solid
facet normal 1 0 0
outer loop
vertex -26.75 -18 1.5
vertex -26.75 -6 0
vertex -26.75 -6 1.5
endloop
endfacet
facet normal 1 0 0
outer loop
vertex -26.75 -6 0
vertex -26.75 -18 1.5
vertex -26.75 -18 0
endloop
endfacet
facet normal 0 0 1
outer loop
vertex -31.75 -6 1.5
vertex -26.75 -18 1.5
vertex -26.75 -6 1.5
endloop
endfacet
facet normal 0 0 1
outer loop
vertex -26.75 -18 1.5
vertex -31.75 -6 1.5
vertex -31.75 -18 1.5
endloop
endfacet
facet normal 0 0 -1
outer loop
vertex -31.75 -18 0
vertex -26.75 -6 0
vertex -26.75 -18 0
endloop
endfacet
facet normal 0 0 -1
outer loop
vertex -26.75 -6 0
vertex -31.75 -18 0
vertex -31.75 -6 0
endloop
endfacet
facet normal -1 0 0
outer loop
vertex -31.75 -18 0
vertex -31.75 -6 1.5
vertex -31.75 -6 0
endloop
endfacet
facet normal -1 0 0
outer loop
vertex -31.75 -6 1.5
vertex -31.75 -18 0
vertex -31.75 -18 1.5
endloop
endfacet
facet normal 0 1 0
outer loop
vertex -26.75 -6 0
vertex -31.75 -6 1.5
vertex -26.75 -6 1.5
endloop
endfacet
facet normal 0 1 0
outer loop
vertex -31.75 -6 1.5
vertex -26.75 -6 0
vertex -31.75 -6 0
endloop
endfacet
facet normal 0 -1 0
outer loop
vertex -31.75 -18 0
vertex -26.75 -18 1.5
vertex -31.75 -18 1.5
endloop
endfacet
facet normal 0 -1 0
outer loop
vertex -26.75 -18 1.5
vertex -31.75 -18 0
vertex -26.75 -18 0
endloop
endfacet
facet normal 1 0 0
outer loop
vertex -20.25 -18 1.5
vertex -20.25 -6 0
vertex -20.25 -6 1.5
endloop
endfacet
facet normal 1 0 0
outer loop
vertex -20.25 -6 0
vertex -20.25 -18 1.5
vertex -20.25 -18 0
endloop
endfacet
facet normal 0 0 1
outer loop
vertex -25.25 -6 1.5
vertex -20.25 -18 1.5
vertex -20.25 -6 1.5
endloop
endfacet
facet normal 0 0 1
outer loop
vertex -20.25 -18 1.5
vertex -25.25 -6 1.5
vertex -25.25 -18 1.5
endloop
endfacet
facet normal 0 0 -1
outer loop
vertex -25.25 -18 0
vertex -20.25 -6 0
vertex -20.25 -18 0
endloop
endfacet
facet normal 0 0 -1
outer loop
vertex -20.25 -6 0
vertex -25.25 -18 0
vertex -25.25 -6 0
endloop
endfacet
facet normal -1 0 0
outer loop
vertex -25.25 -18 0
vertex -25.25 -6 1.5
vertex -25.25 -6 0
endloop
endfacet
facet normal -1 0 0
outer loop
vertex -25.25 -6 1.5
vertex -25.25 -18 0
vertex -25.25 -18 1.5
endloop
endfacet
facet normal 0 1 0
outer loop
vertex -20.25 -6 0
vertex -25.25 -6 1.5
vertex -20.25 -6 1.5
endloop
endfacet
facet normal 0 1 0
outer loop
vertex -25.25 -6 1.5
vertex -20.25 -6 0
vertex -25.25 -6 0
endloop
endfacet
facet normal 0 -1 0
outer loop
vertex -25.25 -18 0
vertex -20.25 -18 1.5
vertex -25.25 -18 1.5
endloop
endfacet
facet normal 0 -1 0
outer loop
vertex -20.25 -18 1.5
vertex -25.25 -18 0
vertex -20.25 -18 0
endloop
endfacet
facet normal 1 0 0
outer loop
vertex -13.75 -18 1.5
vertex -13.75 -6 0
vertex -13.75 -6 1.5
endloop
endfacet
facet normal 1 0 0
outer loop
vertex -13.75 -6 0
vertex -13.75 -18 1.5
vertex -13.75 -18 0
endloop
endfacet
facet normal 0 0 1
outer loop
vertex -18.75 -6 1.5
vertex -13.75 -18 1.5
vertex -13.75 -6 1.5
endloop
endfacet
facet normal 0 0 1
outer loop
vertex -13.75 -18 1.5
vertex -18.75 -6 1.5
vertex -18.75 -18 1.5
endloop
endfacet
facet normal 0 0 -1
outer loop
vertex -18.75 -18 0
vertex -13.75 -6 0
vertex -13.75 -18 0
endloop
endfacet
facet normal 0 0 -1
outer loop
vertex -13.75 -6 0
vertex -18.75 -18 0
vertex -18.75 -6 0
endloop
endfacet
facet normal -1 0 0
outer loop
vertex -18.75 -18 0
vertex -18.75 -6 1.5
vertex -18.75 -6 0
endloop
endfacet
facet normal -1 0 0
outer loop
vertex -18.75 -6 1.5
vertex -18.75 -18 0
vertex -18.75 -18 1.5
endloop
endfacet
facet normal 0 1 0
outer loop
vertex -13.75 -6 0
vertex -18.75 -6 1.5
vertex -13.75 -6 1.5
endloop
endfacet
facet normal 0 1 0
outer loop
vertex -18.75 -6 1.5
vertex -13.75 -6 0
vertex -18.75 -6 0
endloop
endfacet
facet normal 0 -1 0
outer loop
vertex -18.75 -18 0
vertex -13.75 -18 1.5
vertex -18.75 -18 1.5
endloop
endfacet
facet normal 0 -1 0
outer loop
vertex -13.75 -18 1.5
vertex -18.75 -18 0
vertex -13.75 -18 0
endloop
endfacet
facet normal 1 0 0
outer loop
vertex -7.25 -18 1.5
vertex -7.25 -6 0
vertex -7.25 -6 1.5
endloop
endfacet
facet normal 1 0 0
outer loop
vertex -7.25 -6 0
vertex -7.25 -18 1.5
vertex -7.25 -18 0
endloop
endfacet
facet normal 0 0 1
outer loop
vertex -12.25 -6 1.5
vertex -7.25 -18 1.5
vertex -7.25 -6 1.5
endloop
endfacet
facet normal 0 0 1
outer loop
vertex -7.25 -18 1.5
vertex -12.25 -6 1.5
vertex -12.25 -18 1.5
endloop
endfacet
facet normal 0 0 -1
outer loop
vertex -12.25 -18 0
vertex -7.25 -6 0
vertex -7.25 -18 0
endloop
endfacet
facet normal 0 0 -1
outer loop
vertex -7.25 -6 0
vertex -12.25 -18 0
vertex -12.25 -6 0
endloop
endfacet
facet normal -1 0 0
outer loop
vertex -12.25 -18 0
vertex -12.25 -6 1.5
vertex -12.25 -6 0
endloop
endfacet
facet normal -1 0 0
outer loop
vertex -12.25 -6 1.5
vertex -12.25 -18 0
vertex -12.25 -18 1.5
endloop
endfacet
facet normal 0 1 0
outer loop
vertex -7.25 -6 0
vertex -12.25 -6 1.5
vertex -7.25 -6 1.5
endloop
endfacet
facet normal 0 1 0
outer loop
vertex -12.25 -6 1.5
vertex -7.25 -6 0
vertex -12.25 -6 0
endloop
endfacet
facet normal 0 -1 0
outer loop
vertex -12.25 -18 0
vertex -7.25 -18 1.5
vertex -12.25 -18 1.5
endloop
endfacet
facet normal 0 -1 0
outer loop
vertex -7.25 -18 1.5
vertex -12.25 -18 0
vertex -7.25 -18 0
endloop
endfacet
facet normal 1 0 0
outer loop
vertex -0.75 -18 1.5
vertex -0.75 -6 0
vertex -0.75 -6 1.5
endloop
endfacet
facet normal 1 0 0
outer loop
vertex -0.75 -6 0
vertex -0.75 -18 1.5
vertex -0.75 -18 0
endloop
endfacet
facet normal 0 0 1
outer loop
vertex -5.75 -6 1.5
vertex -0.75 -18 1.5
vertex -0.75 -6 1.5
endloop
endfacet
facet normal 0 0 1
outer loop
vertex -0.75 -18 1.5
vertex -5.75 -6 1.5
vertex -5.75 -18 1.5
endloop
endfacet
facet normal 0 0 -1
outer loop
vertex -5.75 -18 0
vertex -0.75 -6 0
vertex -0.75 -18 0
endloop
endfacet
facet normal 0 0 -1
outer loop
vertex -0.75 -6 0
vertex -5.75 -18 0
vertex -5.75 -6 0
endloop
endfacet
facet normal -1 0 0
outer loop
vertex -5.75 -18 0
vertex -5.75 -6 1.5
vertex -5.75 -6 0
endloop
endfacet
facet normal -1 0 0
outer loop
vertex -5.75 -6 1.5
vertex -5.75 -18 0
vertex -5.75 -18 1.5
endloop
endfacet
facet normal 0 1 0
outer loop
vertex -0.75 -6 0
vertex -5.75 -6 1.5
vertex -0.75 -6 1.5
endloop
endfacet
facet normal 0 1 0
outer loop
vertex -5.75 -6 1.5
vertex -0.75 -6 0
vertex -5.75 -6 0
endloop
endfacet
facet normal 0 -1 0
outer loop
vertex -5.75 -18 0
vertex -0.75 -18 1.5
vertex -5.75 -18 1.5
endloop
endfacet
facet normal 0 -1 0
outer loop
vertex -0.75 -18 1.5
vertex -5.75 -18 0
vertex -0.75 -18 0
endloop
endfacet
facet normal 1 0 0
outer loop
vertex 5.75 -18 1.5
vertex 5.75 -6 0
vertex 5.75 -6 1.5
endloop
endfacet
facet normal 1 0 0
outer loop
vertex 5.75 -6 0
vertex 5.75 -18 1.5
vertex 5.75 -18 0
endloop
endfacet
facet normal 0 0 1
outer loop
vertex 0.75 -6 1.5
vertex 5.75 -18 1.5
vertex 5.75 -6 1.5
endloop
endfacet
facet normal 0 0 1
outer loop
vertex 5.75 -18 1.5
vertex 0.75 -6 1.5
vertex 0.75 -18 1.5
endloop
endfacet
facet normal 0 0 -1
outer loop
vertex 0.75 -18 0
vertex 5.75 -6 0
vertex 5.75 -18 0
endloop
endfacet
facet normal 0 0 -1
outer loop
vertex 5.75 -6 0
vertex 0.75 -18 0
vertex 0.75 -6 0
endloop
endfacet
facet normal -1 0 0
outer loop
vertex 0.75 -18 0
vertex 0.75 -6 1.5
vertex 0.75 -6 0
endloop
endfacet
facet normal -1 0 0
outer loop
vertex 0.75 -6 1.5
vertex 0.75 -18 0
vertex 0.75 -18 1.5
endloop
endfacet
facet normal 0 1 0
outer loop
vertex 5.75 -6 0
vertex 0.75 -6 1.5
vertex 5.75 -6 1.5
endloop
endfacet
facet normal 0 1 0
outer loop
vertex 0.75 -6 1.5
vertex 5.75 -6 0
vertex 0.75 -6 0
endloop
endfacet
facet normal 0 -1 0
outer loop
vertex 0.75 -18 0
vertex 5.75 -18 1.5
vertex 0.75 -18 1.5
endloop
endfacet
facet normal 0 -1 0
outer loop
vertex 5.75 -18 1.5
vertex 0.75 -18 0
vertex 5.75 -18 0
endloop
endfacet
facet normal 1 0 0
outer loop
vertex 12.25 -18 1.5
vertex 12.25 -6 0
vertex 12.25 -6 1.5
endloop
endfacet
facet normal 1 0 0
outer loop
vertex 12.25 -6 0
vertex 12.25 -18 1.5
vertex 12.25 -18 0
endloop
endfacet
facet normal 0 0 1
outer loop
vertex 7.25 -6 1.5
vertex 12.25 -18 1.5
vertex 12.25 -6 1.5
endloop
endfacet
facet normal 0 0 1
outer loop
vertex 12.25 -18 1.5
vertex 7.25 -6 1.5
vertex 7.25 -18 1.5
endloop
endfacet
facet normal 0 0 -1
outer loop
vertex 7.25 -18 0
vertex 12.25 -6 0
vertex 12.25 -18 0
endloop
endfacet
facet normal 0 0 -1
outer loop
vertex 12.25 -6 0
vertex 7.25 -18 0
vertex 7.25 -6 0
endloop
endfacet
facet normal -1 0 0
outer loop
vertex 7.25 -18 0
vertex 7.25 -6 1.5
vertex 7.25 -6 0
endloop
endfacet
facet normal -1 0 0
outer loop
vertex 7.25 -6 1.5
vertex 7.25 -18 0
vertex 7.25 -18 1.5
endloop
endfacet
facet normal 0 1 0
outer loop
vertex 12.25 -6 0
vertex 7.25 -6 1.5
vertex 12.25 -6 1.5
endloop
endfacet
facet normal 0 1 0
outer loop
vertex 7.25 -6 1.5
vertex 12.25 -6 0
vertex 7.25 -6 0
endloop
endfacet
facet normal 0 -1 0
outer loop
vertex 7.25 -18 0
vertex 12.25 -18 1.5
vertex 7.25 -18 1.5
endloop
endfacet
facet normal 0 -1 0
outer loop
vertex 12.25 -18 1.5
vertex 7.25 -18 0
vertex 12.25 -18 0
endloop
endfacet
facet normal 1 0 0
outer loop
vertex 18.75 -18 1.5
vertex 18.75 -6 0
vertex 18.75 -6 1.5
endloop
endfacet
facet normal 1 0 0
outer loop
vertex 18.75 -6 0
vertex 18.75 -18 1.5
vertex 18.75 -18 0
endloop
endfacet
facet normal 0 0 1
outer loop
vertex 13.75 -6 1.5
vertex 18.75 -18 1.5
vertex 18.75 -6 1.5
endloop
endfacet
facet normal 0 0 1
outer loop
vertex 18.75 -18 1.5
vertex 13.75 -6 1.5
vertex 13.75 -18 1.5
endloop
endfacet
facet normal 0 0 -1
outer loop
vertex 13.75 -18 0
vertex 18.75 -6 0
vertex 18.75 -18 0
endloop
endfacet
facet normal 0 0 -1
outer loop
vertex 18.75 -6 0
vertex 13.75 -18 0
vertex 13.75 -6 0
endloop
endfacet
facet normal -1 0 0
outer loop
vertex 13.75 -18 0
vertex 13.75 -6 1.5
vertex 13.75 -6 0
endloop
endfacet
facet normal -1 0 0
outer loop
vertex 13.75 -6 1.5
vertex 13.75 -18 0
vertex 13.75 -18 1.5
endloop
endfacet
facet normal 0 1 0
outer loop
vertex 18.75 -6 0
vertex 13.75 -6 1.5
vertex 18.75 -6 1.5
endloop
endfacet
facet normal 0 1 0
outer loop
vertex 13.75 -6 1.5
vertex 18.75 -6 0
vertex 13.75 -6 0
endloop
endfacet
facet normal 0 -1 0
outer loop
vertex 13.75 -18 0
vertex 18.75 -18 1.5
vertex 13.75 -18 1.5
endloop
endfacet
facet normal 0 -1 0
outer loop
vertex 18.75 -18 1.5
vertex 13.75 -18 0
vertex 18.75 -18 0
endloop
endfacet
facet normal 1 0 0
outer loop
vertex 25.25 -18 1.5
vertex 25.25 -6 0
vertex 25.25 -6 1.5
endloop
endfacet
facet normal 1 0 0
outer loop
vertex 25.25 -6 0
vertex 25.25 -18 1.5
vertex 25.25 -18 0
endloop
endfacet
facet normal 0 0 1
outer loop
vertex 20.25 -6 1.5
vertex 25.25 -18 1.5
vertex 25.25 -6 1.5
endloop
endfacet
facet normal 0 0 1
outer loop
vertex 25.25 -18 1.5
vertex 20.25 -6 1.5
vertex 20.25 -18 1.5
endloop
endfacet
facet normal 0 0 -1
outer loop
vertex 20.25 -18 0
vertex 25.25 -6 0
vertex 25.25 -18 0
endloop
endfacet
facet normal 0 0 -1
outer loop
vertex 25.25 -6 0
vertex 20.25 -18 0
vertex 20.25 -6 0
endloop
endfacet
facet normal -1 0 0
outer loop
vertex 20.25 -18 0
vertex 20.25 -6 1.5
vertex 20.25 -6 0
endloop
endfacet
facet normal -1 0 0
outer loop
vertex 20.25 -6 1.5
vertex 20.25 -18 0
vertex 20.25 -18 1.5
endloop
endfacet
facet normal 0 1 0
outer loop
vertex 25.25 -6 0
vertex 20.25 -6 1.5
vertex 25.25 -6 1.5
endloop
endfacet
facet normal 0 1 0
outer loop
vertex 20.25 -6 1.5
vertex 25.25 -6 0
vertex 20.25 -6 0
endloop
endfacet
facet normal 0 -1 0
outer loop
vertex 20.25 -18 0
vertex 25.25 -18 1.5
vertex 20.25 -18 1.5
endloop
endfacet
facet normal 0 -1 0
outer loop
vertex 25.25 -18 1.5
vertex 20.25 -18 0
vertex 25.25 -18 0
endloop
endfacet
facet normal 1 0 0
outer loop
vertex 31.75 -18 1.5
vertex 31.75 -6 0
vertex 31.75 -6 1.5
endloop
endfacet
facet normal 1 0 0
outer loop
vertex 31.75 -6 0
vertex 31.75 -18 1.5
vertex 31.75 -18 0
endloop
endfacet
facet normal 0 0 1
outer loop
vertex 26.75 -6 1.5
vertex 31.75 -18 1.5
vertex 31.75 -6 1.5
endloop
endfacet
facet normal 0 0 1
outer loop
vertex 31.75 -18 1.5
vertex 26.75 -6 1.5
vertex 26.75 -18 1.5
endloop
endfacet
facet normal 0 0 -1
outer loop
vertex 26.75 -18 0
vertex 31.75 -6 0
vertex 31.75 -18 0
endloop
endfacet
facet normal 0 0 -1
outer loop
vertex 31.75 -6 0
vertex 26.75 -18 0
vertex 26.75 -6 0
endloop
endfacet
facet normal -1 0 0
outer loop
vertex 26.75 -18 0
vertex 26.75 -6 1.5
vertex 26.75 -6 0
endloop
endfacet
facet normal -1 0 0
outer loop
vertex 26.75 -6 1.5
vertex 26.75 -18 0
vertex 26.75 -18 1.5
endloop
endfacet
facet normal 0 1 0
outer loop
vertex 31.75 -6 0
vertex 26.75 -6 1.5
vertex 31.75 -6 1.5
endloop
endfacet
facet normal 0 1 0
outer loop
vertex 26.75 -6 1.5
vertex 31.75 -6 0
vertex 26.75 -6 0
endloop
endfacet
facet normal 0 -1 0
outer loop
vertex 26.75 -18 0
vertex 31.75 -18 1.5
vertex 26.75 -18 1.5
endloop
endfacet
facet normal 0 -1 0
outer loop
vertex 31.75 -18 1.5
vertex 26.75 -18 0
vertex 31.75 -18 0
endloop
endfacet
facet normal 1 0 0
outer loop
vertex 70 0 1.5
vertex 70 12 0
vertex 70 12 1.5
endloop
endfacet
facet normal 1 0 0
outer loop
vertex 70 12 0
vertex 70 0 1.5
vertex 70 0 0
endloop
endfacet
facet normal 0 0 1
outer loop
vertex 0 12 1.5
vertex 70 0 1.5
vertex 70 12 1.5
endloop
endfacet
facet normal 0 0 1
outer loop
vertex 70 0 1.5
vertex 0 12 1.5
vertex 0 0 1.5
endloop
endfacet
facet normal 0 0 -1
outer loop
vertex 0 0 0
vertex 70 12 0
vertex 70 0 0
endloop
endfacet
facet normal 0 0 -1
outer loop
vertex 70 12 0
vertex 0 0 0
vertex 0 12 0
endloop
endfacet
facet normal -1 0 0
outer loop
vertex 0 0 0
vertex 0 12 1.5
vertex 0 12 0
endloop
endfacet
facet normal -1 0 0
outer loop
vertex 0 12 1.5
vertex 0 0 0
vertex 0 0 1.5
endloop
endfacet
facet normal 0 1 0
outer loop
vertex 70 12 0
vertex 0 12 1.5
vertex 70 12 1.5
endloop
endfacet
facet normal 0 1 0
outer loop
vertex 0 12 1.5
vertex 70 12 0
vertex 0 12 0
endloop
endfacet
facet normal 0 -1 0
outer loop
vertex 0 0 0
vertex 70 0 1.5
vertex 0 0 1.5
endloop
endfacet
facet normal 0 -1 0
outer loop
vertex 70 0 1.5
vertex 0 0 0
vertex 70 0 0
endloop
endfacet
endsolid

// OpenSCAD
// Dimensions for 10-well agarose gel comb
// Units: millimetres

// Overall plate thickness (Z direction)
thick = 1.5;

// Spine dimensions
spine_len = 70;      // Length along X
spine_wid = 12;      // Width along Y

// Tooth dimensions
tooth_wid = 5.0;     // Width along X
tooth_len = 12;      // Length along Y (hanging in -Y)

// Gap between teeth
gap_wid = 1.5;       // Gap along X

// Number of teeth
num_teeth = 10;

// Calculate total width of teeth + gaps
// Total width = num_teeth * tooth_wid + (num_teeth - 1) * gap_wid
total_tooth_width = num_teeth * tooth_wid + (num_teeth - 1) * gap_wid;

// Calculate the Y position of the teeth
// Spine extends from Y = -spine_wid/2 to Y = +spine_wid/2
// Teeth hang in -Y direction from the spine edge (Y = -spine_wid/2)
// Tooth length is 12mm, so they extend from Y = -spine_wid/2 down to Y = -spine_wid/2 - 12
tooth_start_y = -spine_wid / 2;
tooth_end_y = tooth_start_y - tooth_len;

// Calculate the X offset for the tooth row
// The row is centered on the spine (X=0).
// The total width of the row is total_tooth_width.
// The offset from the center to the start of the first tooth is half the total width.
tooth_row_offset_x = -total_tooth_width / 2;

// Build the comb
module comb() {
    // 1. Create the spine (flat plate)
    // Centered at origin in X and Y, resting on XY plane (Z=0 to Z=thick)
    translate([0, 0, 0])
        cube([spine_len, spine_wid, thick], center = false);

    // 2. Create the teeth
    // We use a loop to create each tooth
    for (i = [0 : num_teeth - 1]) {
        // Calculate X position for this tooth
        // The row starts at tooth_row_offset_x and each tooth is spaced by (tooth_wid + gap_wid)
        tooth_x = tooth_row_offset_x + i * (tooth_wid + gap_wid);
        
        // Create a single tooth
        // Translate to the bottom-left corner of the tooth (center=false)
        // Y position is tooth_end_y (the bottom of the tooth)
        translate([tooth_x, tooth_end_y, 0])
            cube([tooth_wid, tooth_len, thick], center = false);
    }
}

// Final assembly
comb();
